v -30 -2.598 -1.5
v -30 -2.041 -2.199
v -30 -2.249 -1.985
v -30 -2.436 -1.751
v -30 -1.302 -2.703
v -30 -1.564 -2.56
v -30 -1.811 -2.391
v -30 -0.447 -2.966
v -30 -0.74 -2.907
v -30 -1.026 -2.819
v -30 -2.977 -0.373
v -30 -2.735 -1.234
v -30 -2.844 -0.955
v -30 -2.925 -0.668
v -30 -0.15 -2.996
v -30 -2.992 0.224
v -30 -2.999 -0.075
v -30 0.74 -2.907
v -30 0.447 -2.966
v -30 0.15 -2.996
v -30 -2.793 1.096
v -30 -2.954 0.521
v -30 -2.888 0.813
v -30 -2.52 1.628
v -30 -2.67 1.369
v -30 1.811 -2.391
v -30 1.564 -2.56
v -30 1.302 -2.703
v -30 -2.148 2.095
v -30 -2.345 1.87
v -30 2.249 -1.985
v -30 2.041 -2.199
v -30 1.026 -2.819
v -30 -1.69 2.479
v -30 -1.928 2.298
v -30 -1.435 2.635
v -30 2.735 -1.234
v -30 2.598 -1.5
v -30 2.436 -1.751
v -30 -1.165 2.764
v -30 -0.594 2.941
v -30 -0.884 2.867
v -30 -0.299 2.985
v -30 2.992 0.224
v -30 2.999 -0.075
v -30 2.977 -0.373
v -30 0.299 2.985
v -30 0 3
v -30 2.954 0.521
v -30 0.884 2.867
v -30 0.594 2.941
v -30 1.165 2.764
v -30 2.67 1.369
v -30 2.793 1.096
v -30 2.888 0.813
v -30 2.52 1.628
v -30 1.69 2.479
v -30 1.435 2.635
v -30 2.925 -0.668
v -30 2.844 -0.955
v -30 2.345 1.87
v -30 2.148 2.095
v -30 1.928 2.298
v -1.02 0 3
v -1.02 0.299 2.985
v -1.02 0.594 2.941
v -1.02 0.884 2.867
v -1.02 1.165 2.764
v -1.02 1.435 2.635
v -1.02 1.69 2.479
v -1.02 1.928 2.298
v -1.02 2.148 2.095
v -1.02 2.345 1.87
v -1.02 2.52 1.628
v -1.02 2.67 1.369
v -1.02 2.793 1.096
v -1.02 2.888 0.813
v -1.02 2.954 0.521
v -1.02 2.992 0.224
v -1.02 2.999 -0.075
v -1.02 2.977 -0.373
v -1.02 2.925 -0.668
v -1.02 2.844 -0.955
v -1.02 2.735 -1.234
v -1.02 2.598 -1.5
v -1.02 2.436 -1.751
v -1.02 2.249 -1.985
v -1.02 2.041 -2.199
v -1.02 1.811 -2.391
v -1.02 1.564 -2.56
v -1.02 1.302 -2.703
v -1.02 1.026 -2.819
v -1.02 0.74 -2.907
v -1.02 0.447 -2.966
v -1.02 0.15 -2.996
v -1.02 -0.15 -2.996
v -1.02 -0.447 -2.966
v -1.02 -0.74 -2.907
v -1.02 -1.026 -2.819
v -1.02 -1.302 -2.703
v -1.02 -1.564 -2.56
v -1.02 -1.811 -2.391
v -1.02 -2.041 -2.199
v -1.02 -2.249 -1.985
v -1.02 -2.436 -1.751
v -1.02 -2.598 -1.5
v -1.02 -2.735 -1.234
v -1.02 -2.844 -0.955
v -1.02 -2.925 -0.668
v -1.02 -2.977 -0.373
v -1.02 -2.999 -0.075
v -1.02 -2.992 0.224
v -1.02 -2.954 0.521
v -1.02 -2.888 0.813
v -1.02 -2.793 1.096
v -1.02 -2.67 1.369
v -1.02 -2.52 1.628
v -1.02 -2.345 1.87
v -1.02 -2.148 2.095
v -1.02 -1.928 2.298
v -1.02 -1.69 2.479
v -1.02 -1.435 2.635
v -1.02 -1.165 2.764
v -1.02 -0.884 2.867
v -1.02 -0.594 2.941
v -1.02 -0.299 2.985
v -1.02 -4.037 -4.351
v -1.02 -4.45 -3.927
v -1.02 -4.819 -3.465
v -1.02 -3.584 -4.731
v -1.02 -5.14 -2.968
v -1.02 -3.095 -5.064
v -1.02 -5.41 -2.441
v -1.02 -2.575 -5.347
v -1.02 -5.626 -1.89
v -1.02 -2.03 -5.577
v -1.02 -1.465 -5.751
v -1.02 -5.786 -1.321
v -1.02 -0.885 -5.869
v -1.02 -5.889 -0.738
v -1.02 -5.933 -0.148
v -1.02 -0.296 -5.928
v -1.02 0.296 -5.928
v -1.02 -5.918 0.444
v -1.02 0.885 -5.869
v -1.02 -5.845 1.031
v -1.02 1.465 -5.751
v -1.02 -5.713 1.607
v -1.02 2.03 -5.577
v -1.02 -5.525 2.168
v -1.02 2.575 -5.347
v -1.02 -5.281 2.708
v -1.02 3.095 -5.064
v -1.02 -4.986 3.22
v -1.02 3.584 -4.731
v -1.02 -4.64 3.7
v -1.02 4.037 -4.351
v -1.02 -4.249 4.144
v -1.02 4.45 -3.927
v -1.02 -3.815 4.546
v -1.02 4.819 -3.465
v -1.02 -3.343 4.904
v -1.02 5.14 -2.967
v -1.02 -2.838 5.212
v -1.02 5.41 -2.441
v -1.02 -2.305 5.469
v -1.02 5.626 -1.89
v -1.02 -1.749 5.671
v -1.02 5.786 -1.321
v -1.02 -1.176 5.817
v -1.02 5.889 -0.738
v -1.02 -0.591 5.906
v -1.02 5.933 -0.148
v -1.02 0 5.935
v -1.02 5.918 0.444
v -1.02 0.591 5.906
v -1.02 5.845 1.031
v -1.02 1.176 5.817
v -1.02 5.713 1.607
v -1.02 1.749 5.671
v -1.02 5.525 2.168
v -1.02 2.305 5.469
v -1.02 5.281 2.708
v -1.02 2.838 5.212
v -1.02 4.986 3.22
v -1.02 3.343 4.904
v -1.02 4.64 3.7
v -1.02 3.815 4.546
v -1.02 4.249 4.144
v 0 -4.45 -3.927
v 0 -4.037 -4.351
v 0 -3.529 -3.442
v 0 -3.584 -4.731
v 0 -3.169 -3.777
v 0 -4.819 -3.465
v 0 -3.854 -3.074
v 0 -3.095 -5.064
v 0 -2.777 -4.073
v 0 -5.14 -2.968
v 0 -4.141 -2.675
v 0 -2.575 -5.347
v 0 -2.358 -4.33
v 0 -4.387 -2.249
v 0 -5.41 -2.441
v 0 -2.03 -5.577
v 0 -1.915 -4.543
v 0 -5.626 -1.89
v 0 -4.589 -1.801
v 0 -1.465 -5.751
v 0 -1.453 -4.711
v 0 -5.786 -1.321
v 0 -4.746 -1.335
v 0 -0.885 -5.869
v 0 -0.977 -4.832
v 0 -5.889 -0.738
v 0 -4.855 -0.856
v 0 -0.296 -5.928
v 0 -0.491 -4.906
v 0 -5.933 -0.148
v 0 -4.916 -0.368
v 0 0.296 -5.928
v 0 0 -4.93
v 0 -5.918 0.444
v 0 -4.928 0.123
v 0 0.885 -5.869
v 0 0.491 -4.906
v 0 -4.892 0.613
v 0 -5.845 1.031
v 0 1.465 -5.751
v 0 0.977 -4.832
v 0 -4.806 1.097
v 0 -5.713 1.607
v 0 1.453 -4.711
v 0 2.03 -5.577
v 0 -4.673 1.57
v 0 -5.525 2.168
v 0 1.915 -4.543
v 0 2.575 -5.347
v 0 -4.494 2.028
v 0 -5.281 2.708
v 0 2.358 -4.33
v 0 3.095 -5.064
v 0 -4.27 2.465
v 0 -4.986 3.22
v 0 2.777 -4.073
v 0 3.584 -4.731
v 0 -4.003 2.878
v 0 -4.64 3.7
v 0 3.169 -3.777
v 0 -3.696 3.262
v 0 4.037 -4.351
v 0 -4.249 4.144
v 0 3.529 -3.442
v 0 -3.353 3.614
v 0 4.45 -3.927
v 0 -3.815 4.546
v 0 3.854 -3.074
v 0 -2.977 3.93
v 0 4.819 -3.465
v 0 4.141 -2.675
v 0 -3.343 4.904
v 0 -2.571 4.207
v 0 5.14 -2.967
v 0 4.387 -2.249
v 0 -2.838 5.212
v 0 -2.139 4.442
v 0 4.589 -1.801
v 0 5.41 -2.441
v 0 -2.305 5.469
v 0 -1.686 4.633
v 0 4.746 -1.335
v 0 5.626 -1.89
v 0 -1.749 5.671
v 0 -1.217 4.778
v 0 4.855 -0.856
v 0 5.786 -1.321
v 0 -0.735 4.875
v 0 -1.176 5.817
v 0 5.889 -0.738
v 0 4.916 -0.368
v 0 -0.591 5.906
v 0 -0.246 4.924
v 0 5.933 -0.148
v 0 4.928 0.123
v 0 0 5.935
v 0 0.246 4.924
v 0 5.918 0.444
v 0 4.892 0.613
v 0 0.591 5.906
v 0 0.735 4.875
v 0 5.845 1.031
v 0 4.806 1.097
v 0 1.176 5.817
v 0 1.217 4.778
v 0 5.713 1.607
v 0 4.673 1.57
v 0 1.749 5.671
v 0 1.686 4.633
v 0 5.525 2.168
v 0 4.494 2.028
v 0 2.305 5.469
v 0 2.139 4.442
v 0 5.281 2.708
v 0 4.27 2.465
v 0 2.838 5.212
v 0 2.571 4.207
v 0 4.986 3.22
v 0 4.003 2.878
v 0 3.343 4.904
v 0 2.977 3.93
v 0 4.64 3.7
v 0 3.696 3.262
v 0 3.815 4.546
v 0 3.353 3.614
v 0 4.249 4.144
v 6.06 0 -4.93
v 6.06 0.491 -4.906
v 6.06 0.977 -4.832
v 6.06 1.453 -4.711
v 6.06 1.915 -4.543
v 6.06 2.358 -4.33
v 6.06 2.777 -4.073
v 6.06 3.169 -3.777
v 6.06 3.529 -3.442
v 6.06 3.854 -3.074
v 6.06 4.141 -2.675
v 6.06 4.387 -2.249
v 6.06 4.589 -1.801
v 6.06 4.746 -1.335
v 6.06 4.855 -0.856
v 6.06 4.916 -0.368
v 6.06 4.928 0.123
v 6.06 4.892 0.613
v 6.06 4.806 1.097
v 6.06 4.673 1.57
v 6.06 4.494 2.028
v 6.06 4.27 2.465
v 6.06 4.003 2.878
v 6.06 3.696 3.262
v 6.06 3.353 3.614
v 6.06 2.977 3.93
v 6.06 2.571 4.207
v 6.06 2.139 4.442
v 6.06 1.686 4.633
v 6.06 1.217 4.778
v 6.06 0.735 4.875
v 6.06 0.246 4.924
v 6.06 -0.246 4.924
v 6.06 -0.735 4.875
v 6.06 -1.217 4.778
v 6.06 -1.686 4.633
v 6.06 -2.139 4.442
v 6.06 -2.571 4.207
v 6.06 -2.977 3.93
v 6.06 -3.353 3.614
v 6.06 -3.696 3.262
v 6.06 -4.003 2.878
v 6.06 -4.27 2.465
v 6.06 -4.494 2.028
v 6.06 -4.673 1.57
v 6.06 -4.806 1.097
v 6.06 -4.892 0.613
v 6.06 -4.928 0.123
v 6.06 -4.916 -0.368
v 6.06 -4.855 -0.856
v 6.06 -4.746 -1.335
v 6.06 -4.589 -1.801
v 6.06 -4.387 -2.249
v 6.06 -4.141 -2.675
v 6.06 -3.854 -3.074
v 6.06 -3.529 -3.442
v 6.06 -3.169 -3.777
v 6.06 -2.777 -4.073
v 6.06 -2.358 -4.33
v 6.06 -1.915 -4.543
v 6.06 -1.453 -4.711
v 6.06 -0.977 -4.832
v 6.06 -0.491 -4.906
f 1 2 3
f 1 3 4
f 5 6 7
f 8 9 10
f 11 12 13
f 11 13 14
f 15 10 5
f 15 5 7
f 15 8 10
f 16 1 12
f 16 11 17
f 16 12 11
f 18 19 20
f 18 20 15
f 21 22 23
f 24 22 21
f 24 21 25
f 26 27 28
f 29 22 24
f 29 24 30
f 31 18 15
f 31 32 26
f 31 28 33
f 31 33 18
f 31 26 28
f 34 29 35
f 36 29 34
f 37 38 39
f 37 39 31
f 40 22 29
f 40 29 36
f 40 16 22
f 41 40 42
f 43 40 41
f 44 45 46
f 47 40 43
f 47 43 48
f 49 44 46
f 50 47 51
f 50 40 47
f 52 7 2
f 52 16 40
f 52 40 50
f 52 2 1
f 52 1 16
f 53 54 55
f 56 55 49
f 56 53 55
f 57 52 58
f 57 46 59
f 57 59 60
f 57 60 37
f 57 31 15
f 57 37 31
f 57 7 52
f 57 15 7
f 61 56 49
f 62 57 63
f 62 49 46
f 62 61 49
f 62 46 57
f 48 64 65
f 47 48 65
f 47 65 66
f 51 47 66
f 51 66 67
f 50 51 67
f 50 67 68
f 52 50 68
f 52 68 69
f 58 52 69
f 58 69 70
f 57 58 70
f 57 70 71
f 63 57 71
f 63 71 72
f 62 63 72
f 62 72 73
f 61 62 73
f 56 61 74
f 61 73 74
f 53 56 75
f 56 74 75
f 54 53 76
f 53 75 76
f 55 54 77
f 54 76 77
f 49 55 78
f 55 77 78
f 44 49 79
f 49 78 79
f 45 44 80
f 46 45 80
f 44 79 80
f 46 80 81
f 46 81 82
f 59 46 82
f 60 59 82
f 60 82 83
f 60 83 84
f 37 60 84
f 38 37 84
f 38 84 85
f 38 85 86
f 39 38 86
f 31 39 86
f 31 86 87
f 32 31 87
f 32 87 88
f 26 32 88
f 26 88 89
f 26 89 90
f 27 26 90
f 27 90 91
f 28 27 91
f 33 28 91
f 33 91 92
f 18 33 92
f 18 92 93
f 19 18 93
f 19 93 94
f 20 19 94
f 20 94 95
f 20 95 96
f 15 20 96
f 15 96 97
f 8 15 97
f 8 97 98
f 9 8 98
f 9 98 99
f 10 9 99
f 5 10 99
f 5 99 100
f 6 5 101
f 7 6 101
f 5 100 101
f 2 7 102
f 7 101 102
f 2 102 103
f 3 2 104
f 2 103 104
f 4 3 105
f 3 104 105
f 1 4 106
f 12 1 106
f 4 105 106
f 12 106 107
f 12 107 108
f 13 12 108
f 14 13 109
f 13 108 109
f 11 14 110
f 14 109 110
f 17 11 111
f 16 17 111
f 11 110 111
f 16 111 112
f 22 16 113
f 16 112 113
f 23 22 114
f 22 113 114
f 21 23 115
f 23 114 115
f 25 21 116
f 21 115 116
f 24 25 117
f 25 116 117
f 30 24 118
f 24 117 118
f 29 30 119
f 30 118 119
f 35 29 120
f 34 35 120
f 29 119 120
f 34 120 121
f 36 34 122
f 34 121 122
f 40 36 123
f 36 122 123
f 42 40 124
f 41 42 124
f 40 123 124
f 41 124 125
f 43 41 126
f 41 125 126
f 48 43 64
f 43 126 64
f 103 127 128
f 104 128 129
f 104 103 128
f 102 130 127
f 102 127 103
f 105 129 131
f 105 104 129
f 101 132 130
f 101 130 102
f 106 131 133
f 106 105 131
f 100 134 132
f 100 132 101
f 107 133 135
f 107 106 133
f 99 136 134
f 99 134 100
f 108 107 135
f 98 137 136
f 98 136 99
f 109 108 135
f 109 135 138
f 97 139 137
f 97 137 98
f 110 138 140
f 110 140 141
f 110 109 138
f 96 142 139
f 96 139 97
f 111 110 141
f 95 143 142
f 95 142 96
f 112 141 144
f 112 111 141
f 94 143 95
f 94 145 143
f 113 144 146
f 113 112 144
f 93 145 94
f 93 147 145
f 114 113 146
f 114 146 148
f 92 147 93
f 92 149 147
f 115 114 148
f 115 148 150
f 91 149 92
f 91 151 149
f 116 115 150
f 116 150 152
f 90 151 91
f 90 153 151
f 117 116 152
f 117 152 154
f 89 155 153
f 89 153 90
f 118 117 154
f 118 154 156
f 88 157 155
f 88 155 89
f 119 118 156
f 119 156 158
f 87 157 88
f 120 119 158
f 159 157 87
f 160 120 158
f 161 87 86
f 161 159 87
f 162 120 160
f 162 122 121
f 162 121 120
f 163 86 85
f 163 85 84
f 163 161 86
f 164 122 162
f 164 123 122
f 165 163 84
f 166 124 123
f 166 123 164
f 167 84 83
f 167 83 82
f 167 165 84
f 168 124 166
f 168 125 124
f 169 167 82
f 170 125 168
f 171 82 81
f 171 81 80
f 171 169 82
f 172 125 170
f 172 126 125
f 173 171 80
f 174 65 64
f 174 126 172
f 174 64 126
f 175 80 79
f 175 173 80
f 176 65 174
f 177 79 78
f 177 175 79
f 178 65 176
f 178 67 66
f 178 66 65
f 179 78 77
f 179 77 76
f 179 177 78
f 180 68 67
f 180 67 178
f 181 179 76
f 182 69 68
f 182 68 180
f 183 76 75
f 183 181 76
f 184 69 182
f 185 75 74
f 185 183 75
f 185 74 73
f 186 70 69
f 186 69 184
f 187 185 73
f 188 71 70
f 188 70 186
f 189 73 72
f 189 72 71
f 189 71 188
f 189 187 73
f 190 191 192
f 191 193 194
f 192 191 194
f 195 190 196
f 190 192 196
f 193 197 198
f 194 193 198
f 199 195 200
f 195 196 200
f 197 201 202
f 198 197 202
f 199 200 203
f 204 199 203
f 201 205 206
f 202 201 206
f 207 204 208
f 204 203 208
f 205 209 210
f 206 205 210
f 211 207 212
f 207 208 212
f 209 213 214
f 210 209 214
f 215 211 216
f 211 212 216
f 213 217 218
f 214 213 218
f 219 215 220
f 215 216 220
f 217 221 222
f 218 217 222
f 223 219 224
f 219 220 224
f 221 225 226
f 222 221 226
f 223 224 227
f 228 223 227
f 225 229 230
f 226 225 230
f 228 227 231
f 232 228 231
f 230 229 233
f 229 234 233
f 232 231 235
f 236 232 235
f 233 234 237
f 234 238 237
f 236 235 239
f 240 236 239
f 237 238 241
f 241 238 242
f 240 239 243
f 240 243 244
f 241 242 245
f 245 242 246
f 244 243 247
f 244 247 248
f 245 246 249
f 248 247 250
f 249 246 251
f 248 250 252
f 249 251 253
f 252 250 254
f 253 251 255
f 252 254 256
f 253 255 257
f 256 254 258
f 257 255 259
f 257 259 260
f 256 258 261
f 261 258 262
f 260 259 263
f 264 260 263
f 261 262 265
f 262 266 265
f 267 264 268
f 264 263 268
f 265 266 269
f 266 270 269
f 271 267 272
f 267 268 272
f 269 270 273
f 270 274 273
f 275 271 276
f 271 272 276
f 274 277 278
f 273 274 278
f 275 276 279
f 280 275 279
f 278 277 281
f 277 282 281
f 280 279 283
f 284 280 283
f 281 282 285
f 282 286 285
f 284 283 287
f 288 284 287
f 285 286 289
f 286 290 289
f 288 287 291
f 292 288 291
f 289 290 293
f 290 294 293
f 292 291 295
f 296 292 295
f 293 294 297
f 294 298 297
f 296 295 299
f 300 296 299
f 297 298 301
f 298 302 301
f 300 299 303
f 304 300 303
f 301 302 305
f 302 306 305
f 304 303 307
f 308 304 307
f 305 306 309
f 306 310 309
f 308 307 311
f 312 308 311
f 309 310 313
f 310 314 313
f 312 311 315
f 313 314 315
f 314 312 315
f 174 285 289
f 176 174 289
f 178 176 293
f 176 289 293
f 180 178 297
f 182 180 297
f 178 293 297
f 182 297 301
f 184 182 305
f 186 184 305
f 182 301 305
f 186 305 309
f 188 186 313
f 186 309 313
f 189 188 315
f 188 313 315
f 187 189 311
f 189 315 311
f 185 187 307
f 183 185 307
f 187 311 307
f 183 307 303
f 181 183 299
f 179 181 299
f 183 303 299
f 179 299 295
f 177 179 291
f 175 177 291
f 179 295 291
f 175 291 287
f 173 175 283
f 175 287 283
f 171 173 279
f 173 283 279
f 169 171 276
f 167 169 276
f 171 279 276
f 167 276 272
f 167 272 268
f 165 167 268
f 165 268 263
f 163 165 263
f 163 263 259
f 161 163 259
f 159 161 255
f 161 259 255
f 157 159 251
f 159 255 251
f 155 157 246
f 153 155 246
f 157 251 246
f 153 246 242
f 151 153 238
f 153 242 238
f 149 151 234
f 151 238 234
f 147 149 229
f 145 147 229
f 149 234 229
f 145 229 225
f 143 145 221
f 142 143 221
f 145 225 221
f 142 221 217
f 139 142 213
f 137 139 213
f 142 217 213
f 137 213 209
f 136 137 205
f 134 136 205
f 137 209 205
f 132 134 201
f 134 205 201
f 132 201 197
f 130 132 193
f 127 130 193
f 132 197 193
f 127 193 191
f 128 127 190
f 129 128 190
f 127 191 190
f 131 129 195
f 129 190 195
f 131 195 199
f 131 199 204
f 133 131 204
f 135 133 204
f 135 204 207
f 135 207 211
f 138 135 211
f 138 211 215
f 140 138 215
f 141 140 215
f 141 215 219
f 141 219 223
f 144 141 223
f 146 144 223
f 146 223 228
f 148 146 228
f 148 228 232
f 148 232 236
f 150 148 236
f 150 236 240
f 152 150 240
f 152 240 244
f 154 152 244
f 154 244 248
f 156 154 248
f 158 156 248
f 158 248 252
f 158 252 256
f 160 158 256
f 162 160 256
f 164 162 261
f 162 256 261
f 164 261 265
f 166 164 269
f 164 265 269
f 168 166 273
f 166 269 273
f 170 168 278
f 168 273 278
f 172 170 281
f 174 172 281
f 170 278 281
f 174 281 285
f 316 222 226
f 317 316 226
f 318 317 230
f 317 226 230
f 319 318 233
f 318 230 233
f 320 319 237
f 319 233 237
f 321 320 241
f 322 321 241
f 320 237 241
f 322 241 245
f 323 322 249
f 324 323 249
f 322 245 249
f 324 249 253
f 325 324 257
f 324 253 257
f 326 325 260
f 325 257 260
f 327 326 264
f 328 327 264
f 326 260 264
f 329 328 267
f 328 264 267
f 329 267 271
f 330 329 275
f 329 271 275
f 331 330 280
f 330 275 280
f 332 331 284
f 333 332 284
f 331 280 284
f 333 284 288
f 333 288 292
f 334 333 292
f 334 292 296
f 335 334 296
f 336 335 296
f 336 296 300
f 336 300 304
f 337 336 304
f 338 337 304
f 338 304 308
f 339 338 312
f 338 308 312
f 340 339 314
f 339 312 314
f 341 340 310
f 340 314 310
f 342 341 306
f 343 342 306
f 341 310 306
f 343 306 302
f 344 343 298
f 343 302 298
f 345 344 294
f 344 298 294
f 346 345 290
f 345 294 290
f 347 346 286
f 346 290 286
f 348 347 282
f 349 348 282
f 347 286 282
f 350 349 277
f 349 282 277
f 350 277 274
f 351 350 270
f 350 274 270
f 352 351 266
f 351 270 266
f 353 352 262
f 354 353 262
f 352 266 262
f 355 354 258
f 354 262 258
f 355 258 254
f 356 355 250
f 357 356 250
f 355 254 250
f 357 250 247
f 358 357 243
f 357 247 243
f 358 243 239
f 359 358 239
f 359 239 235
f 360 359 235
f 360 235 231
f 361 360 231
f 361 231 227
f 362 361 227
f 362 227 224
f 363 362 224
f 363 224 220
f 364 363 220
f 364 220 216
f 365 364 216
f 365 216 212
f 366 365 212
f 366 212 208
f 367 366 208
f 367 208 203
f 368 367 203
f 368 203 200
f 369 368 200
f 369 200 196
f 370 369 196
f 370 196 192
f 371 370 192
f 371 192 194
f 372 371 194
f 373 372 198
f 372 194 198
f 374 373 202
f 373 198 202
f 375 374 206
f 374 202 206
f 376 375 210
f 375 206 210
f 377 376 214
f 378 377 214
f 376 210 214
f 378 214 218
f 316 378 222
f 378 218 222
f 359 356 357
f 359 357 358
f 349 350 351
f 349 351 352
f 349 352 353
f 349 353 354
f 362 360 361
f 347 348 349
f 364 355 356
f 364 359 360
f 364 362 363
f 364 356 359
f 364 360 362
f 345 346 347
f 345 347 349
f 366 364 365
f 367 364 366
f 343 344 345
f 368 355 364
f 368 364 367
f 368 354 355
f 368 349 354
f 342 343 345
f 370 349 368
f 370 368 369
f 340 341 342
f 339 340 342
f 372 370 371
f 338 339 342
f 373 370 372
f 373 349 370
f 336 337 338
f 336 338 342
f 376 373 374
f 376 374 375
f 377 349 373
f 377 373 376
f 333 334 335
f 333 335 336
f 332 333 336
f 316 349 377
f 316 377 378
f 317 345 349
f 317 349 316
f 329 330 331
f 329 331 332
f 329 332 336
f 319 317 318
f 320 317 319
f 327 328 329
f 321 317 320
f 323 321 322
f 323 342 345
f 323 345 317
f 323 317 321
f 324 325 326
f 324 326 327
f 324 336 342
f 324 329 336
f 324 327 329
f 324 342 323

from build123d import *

# Parameters (mm, degrees)
SKETCH1_R           = 4.93
BOSS_EXTRUDE1_DEPTH = 6.06
SKETCH2_R           = 3
BOSS_EXTRUDE2_DEPTH = 30
SKETCH3_R           = 5.935
BOSS_EXTRUDE3_DEPTH = 1.02


with BuildPart() as part:
    # Sketch1 → Boss-Extrude1 (new body)
    with BuildSketch(Plane(origin=(0, 0, 0), x_dir=(0, 0, -1), z_dir=(1, 0, 0))):
        Circle(SKETCH1_R)
    extrude(amount=BOSS_EXTRUDE1_DEPTH)

    # Sketch2 → Boss-Extrude2 (add)
    with BuildSketch(Plane.ZY):
        Circle(SKETCH2_R)
    extrude(amount=BOSS_EXTRUDE2_DEPTH)

    # Sketch3 → Boss-Extrude3 (add)
    with BuildSketch(Plane.ZY):
        Circle(SKETCH3_R)
    extrude(amount=BOSS_EXTRUDE3_DEPTH)


solid = part.part
